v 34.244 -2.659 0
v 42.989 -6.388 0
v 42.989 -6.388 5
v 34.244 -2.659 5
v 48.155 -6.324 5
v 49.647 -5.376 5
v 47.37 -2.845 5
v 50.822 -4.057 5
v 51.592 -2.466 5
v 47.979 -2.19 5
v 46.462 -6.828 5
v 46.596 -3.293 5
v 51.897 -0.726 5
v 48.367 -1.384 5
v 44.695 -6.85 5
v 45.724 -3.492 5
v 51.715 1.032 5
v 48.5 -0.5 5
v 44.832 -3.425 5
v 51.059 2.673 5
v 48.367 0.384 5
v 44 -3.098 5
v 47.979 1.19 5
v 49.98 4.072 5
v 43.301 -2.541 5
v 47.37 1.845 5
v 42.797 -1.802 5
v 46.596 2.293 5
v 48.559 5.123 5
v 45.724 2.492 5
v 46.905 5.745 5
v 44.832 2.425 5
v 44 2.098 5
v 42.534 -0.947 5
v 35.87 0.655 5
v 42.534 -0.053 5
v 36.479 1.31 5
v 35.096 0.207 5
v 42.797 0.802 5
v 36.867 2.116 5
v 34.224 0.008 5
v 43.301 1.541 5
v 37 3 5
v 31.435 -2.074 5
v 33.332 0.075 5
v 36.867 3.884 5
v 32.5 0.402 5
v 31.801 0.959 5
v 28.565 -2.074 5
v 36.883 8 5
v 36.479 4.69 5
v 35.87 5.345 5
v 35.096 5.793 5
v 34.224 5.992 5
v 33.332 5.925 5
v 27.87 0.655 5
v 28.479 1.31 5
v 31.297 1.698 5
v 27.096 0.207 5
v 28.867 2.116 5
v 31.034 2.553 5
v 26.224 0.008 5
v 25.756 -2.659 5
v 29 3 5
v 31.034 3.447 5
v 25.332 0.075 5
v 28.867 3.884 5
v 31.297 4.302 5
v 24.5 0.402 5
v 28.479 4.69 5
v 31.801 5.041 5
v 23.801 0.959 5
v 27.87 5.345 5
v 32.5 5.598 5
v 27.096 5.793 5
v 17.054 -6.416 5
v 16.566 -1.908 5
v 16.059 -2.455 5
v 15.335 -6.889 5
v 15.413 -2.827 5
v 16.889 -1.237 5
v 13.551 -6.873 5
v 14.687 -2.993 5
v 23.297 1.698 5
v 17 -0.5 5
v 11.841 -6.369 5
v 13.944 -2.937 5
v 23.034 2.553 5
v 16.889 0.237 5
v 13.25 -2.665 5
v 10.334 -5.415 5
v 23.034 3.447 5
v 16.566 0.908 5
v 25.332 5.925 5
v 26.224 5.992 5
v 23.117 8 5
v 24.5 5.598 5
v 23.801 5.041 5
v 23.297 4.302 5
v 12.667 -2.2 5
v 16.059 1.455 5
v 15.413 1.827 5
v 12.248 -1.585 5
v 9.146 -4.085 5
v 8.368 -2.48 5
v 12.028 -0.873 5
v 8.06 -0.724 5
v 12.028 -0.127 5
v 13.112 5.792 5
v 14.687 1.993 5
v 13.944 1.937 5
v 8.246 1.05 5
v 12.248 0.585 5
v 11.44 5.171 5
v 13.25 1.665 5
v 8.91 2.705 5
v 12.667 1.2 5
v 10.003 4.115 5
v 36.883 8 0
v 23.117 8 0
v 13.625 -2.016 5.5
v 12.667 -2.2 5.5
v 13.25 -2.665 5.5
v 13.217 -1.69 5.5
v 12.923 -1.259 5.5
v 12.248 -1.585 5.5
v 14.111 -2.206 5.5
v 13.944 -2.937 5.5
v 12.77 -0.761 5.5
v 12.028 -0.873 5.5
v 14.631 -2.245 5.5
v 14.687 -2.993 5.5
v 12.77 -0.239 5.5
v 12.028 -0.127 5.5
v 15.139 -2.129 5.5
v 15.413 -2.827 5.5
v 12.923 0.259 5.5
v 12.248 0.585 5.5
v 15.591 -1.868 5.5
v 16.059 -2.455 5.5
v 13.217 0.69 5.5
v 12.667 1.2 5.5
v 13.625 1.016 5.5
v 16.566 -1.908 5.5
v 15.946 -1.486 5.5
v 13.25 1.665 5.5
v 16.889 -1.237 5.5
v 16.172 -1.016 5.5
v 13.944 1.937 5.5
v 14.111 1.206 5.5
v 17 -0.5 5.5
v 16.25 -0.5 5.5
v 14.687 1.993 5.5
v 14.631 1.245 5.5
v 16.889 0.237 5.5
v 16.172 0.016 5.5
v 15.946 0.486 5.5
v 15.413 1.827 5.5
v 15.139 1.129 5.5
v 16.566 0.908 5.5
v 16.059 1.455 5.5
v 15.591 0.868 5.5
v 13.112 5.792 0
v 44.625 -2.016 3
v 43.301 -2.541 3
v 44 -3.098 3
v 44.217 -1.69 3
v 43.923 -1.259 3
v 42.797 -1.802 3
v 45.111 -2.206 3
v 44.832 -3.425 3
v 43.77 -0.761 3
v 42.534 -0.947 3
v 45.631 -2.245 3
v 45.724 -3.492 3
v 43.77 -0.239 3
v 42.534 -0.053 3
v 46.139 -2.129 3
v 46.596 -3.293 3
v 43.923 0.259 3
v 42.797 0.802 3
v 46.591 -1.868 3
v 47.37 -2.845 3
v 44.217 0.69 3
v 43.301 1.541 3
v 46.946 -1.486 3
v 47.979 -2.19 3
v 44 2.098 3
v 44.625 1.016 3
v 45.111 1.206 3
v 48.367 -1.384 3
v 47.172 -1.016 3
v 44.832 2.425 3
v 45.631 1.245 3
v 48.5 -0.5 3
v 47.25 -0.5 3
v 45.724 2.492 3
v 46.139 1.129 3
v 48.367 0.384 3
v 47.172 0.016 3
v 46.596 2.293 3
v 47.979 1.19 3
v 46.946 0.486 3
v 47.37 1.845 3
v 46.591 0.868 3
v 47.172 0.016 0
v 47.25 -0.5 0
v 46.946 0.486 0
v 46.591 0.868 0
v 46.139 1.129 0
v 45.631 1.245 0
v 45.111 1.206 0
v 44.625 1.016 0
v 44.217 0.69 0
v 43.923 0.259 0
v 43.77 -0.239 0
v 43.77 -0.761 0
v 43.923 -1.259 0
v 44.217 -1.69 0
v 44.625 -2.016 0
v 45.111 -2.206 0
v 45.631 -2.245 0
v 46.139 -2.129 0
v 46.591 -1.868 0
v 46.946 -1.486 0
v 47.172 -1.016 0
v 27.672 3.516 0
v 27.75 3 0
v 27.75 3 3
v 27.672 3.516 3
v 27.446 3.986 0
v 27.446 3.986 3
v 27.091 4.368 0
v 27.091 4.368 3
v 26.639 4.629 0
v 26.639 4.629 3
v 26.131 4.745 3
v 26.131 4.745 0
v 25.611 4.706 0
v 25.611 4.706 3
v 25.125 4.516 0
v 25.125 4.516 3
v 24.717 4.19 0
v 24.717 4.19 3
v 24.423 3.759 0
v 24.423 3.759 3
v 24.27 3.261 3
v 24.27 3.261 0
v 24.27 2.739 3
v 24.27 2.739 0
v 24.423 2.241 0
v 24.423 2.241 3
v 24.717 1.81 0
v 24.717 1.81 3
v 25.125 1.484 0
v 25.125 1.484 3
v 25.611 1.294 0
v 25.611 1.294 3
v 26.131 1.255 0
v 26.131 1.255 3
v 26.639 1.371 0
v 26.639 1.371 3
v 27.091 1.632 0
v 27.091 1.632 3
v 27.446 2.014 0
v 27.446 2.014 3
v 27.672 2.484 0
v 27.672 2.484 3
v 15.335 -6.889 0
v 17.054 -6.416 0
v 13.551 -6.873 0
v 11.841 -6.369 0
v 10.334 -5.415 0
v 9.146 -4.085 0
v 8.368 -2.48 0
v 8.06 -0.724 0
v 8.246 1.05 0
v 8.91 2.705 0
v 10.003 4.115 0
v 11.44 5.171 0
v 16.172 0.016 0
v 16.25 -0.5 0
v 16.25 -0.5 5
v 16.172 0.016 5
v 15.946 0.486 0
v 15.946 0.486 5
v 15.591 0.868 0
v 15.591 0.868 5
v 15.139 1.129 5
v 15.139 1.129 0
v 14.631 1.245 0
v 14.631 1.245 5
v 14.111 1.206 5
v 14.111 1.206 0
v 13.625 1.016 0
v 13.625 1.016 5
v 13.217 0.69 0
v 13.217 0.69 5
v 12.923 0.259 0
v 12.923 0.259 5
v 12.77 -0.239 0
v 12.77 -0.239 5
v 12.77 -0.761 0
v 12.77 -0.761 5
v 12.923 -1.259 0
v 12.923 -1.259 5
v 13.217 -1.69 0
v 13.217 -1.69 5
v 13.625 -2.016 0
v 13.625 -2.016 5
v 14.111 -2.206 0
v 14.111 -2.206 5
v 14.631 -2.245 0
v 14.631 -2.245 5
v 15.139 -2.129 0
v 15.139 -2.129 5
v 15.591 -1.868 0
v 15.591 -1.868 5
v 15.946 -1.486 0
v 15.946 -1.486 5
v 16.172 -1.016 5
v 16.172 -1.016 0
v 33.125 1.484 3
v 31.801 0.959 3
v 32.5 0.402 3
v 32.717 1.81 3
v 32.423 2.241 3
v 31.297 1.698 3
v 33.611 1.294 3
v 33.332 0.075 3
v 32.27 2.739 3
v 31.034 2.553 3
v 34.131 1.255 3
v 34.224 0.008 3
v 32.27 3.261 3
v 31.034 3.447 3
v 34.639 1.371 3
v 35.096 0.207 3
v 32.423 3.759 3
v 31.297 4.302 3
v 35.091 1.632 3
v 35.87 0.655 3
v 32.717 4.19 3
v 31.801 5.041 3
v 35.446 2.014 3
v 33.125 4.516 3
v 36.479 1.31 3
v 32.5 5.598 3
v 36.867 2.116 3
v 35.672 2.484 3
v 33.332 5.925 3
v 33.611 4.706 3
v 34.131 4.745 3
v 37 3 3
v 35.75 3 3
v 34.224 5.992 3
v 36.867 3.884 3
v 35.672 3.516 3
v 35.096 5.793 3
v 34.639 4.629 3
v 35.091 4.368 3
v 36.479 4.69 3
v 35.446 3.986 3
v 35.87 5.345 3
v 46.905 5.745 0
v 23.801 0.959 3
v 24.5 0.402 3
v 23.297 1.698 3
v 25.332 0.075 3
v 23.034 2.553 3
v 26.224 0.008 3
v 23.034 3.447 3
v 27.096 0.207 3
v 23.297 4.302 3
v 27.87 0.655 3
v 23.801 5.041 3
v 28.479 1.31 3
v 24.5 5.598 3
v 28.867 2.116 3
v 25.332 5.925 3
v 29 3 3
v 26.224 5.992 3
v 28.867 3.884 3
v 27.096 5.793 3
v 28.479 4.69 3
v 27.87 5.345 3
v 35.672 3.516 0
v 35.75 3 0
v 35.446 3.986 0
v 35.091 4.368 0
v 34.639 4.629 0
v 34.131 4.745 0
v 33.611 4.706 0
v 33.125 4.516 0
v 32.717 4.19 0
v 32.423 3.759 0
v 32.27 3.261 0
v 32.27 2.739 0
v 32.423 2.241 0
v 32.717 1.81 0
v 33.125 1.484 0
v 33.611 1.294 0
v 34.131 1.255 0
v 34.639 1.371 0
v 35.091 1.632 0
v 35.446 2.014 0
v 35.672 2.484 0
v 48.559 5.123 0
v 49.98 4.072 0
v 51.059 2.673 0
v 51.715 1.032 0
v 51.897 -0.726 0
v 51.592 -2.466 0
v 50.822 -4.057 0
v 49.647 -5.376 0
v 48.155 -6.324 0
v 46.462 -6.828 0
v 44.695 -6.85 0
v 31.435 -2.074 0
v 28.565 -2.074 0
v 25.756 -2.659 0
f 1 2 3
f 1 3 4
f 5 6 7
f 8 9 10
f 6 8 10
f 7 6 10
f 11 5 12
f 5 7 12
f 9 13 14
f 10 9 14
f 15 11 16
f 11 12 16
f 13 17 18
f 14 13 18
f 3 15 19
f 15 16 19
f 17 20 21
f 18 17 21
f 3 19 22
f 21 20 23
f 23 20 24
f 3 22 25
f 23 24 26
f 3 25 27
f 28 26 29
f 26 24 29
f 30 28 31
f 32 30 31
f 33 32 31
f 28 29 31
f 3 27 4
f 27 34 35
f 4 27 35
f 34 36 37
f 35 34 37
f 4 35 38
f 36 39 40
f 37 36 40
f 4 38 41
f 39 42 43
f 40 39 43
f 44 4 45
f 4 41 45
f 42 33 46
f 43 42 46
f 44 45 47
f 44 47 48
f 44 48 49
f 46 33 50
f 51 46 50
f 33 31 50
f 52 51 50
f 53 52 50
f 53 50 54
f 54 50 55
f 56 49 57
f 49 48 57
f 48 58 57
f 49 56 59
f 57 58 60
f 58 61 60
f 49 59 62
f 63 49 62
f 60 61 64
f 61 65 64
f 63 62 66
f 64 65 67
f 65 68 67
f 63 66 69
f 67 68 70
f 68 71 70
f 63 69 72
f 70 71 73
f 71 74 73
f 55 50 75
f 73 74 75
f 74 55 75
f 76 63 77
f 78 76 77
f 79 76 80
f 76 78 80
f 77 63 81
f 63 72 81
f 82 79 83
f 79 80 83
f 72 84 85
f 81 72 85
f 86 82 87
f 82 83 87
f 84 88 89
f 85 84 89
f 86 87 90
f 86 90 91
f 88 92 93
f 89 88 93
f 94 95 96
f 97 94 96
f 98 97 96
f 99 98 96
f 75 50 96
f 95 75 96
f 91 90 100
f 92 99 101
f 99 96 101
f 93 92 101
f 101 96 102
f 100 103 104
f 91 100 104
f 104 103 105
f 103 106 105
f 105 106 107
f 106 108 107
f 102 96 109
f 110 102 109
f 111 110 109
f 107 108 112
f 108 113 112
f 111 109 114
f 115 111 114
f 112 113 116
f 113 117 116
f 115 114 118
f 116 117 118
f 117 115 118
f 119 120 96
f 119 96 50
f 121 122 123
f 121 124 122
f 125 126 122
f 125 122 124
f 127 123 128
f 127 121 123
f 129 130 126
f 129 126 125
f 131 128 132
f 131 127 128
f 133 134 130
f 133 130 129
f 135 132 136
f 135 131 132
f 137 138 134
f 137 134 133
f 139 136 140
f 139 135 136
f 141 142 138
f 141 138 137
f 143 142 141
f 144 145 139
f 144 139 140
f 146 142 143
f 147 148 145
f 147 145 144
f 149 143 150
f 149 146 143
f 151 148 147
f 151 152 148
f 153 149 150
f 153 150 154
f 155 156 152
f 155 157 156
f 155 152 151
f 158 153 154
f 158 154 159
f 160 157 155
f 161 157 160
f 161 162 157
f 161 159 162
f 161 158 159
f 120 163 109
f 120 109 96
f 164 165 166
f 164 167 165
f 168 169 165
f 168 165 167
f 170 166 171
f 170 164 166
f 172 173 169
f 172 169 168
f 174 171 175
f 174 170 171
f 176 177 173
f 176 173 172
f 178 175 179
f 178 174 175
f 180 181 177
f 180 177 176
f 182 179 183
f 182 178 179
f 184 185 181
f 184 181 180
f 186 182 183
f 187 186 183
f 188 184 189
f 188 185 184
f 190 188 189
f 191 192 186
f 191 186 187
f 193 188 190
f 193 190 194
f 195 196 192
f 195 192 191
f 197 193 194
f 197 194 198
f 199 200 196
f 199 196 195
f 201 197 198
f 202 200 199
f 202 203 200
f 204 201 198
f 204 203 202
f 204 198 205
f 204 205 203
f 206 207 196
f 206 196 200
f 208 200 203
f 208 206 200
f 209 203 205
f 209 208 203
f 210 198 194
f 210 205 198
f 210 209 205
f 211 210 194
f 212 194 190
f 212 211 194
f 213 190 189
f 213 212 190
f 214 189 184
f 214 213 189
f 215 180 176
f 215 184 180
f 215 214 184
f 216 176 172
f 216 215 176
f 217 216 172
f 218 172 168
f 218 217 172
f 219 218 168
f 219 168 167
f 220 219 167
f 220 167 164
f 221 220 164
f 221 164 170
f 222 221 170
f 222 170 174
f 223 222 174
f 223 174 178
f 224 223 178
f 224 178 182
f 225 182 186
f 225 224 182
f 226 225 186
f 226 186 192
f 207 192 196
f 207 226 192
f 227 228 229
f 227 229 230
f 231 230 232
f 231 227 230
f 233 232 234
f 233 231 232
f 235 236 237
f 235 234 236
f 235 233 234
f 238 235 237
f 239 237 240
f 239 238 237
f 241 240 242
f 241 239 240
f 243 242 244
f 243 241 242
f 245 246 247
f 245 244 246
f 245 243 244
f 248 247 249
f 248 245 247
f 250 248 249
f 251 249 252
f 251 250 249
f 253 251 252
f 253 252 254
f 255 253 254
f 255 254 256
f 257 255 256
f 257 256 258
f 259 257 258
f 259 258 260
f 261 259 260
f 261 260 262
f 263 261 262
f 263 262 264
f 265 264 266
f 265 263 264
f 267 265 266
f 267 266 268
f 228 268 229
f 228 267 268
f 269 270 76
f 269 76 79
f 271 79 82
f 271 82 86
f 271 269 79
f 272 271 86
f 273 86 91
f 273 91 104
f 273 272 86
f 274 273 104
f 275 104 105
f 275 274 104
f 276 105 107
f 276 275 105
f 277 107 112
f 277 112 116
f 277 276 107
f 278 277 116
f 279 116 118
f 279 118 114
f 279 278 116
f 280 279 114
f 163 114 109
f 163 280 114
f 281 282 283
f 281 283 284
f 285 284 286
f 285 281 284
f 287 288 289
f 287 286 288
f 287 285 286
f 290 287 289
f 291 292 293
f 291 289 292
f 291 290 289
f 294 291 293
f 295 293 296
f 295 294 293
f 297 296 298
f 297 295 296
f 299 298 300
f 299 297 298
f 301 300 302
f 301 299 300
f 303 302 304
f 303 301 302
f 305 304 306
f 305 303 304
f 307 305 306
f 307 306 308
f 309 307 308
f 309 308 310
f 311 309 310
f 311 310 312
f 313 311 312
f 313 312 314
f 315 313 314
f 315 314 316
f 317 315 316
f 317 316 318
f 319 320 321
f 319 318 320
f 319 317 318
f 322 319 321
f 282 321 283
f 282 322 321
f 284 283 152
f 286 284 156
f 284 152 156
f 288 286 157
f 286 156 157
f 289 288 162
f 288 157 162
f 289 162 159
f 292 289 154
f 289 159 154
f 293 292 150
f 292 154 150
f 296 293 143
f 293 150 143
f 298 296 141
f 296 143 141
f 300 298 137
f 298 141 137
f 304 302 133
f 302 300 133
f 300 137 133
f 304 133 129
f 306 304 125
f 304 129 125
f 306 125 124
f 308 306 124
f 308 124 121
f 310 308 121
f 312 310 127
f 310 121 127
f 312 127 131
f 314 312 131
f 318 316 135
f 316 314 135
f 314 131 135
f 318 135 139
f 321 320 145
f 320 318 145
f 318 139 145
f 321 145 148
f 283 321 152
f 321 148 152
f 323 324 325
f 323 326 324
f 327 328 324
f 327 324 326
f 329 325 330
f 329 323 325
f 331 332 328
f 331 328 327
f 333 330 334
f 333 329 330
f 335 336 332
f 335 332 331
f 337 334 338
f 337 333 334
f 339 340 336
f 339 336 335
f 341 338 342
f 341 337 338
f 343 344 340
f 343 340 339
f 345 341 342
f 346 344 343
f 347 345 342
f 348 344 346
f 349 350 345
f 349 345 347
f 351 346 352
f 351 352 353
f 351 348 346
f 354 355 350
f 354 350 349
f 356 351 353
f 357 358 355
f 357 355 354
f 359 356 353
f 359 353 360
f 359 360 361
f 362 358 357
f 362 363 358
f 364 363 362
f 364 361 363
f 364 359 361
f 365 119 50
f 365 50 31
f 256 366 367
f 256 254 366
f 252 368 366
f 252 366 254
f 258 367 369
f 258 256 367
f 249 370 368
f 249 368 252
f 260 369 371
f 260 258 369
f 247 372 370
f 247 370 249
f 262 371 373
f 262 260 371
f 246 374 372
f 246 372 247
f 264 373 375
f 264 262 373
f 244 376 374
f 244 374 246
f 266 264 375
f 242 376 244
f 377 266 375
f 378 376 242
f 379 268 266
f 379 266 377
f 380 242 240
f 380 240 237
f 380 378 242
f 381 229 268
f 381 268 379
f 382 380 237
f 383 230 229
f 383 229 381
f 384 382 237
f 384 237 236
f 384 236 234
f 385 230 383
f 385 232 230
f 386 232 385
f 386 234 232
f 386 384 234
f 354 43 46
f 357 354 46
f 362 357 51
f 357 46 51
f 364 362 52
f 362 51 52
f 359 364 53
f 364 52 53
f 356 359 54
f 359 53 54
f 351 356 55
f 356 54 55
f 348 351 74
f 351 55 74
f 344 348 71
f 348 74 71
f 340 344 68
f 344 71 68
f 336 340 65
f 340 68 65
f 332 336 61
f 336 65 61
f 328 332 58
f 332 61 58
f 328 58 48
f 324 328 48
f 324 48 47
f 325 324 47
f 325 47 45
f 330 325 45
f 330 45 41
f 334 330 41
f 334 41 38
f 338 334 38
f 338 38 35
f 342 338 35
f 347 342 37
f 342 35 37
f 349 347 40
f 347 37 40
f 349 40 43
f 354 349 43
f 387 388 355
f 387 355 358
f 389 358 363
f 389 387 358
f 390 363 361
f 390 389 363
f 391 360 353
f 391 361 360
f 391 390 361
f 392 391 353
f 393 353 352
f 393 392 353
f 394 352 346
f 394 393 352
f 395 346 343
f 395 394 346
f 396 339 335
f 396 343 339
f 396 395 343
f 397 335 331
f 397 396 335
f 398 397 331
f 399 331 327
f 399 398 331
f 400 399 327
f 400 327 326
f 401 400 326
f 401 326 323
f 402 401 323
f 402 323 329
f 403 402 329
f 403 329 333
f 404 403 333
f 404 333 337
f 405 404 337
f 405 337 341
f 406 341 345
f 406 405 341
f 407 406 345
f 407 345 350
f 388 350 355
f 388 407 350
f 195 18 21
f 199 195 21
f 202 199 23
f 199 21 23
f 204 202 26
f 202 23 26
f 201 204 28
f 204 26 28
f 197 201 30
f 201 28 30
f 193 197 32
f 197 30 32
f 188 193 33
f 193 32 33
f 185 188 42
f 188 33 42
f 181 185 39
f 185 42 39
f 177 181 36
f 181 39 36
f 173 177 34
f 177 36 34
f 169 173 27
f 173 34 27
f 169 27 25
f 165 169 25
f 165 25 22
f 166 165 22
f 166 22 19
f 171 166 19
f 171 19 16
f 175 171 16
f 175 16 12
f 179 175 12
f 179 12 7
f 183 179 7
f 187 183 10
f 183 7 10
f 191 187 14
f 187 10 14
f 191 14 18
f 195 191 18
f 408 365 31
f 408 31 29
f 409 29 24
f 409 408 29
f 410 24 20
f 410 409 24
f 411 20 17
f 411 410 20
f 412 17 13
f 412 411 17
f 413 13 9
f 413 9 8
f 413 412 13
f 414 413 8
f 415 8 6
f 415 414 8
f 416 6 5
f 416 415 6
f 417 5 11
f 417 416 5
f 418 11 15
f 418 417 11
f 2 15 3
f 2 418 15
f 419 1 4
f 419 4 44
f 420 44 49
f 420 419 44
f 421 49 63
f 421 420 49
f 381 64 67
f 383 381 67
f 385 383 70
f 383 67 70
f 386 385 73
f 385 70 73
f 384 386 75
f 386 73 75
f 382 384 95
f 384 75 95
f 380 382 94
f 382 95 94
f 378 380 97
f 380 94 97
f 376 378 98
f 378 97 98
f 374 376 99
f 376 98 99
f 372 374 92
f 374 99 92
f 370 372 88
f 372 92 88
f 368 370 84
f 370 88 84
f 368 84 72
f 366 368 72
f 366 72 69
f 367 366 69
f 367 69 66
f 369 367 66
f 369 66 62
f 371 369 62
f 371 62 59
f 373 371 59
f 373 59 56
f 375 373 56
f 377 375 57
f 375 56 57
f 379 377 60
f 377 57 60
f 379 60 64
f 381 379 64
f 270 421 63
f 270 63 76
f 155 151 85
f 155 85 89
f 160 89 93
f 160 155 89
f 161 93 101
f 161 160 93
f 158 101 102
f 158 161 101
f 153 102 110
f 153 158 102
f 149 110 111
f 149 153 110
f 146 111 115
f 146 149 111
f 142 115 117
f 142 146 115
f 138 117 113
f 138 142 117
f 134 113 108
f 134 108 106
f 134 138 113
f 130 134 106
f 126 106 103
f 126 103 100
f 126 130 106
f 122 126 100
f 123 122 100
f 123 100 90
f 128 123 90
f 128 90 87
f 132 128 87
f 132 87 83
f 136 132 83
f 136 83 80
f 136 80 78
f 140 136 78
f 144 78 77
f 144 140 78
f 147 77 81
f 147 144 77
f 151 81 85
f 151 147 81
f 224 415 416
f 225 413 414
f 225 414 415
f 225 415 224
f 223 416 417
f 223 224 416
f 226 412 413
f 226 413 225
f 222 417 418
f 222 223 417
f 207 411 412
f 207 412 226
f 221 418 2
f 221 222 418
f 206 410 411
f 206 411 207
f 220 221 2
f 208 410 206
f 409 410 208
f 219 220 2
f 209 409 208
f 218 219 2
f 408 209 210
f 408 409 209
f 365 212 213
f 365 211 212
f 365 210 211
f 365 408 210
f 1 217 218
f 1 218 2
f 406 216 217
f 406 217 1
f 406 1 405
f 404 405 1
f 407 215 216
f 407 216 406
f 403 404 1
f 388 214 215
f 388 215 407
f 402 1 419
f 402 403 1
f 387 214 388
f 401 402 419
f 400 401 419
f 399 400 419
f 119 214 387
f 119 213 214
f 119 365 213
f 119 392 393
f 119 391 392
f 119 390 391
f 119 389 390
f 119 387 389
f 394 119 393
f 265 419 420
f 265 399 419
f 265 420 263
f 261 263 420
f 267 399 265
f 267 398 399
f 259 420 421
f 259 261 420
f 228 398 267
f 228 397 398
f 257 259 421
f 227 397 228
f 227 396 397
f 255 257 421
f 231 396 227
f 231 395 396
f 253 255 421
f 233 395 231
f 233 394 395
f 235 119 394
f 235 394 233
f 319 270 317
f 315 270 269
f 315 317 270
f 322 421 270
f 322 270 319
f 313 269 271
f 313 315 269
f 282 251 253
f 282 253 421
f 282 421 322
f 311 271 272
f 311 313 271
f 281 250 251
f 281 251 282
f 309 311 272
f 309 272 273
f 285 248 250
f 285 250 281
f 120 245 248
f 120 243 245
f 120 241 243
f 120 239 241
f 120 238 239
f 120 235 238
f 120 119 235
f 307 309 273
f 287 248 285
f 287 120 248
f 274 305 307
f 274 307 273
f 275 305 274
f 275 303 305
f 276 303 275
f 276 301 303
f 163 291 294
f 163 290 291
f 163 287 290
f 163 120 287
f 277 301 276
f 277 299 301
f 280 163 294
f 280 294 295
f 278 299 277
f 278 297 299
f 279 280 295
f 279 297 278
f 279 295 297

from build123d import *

# Parameters (mm, degrees)
BOSS_EXTRUDE1_DEPTH     = 5
CUT_EXTRUDE1_DEPTH      = 53.75142939
CUT_EXTRUDE1_DEPTH_BACK = 53.75142939
SKETCH2_R               = 1.75
BOSS_EXTRUDE2_START     = 0.5
SKETCH3_R               = 2.5
SKETCH3_R_2             = 1.75
BOSS_EXTRUDE2_DEPTH     = 0.5
SKETCH5_R               = 3
CUT_EXTRUDE2_DEPTH      = 2


with BuildPart() as part:
    # Sketch1 → Boss-Extrude1 (new body)
    with BuildSketch(Plane.XY):
        with BuildLine():
            Line((23.11684397, 8), (36.88315603, 8))
            Line((36.88315603, 8), (46.90520921, 5.744848006))
            ThreePointArc((46.90520921, 5.744848006), (51.591551748, -2.466147717), (42.989140572, -6.387981358))
            Line((42.989140572, -6.387981358), (34.244441462, -2.658908715))
            ThreePointArc((34.244441462, -2.658908715), (30, -2), (25.755558538, -2.658908715))
            Line((25.755558538, -2.658908715), (17.05409045, -6.415729603))
            ThreePointArc((17.05409045, -6.415729603), (8.36828995, -2.480244081), (13.111532947, 5.792169261))
            Line((13.111532947, 5.792169261), (23.11684397, 8))
        make_face()
    extrude(amount=BOSS_EXTRUDE1_DEPTH)

    # Sketch2 → Cut-Extrude1 (cut, two sides: drawn at the far end of the back side and taken through both)
    with BuildSketch(Plane.XY.offset(5).offset(-CUT_EXTRUDE1_DEPTH_BACK)):
        with Locations((45.5, -0.5)):
            Circle(SKETCH2_R)
        with Locations((14.5, -0.5)):
            Circle(SKETCH2_R)
        with Locations((26, 3)):
            Circle(SKETCH2_R)
        with Locations((34, 3)):
            Circle(SKETCH2_R)
    extrude(amount=CUT_EXTRUDE1_DEPTH + CUT_EXTRUDE1_DEPTH_BACK, mode=Mode.SUBTRACT)

    # Sketch3 → Boss-Extrude2 (add)
    with BuildSketch(Plane.XY.offset(5).offset(BOSS_EXTRUDE2_START)):
        with Locations((14.5, -0.5)):
            Circle(SKETCH3_R)
        with Locations((14.5, -0.5)):
            Circle(SKETCH3_R_2, mode=Mode.SUBTRACT)
    extrude(amount=-BOSS_EXTRUDE2_DEPTH)

    # Sketch5 → Cut-Extrude2 (cut)
    with BuildSketch(Plane.XY.offset(5)):
        with Locations((26, 3)):
            Circle(SKETCH5_R)
        with Locations((34, 3)):
            Circle(SKETCH5_R)
        with Locations((45.5, -0.5)):
            Circle(SKETCH5_R)
    extrude(amount=-CUT_EXTRUDE2_DEPTH, mode=Mode.SUBTRACT)


solid = part.part
